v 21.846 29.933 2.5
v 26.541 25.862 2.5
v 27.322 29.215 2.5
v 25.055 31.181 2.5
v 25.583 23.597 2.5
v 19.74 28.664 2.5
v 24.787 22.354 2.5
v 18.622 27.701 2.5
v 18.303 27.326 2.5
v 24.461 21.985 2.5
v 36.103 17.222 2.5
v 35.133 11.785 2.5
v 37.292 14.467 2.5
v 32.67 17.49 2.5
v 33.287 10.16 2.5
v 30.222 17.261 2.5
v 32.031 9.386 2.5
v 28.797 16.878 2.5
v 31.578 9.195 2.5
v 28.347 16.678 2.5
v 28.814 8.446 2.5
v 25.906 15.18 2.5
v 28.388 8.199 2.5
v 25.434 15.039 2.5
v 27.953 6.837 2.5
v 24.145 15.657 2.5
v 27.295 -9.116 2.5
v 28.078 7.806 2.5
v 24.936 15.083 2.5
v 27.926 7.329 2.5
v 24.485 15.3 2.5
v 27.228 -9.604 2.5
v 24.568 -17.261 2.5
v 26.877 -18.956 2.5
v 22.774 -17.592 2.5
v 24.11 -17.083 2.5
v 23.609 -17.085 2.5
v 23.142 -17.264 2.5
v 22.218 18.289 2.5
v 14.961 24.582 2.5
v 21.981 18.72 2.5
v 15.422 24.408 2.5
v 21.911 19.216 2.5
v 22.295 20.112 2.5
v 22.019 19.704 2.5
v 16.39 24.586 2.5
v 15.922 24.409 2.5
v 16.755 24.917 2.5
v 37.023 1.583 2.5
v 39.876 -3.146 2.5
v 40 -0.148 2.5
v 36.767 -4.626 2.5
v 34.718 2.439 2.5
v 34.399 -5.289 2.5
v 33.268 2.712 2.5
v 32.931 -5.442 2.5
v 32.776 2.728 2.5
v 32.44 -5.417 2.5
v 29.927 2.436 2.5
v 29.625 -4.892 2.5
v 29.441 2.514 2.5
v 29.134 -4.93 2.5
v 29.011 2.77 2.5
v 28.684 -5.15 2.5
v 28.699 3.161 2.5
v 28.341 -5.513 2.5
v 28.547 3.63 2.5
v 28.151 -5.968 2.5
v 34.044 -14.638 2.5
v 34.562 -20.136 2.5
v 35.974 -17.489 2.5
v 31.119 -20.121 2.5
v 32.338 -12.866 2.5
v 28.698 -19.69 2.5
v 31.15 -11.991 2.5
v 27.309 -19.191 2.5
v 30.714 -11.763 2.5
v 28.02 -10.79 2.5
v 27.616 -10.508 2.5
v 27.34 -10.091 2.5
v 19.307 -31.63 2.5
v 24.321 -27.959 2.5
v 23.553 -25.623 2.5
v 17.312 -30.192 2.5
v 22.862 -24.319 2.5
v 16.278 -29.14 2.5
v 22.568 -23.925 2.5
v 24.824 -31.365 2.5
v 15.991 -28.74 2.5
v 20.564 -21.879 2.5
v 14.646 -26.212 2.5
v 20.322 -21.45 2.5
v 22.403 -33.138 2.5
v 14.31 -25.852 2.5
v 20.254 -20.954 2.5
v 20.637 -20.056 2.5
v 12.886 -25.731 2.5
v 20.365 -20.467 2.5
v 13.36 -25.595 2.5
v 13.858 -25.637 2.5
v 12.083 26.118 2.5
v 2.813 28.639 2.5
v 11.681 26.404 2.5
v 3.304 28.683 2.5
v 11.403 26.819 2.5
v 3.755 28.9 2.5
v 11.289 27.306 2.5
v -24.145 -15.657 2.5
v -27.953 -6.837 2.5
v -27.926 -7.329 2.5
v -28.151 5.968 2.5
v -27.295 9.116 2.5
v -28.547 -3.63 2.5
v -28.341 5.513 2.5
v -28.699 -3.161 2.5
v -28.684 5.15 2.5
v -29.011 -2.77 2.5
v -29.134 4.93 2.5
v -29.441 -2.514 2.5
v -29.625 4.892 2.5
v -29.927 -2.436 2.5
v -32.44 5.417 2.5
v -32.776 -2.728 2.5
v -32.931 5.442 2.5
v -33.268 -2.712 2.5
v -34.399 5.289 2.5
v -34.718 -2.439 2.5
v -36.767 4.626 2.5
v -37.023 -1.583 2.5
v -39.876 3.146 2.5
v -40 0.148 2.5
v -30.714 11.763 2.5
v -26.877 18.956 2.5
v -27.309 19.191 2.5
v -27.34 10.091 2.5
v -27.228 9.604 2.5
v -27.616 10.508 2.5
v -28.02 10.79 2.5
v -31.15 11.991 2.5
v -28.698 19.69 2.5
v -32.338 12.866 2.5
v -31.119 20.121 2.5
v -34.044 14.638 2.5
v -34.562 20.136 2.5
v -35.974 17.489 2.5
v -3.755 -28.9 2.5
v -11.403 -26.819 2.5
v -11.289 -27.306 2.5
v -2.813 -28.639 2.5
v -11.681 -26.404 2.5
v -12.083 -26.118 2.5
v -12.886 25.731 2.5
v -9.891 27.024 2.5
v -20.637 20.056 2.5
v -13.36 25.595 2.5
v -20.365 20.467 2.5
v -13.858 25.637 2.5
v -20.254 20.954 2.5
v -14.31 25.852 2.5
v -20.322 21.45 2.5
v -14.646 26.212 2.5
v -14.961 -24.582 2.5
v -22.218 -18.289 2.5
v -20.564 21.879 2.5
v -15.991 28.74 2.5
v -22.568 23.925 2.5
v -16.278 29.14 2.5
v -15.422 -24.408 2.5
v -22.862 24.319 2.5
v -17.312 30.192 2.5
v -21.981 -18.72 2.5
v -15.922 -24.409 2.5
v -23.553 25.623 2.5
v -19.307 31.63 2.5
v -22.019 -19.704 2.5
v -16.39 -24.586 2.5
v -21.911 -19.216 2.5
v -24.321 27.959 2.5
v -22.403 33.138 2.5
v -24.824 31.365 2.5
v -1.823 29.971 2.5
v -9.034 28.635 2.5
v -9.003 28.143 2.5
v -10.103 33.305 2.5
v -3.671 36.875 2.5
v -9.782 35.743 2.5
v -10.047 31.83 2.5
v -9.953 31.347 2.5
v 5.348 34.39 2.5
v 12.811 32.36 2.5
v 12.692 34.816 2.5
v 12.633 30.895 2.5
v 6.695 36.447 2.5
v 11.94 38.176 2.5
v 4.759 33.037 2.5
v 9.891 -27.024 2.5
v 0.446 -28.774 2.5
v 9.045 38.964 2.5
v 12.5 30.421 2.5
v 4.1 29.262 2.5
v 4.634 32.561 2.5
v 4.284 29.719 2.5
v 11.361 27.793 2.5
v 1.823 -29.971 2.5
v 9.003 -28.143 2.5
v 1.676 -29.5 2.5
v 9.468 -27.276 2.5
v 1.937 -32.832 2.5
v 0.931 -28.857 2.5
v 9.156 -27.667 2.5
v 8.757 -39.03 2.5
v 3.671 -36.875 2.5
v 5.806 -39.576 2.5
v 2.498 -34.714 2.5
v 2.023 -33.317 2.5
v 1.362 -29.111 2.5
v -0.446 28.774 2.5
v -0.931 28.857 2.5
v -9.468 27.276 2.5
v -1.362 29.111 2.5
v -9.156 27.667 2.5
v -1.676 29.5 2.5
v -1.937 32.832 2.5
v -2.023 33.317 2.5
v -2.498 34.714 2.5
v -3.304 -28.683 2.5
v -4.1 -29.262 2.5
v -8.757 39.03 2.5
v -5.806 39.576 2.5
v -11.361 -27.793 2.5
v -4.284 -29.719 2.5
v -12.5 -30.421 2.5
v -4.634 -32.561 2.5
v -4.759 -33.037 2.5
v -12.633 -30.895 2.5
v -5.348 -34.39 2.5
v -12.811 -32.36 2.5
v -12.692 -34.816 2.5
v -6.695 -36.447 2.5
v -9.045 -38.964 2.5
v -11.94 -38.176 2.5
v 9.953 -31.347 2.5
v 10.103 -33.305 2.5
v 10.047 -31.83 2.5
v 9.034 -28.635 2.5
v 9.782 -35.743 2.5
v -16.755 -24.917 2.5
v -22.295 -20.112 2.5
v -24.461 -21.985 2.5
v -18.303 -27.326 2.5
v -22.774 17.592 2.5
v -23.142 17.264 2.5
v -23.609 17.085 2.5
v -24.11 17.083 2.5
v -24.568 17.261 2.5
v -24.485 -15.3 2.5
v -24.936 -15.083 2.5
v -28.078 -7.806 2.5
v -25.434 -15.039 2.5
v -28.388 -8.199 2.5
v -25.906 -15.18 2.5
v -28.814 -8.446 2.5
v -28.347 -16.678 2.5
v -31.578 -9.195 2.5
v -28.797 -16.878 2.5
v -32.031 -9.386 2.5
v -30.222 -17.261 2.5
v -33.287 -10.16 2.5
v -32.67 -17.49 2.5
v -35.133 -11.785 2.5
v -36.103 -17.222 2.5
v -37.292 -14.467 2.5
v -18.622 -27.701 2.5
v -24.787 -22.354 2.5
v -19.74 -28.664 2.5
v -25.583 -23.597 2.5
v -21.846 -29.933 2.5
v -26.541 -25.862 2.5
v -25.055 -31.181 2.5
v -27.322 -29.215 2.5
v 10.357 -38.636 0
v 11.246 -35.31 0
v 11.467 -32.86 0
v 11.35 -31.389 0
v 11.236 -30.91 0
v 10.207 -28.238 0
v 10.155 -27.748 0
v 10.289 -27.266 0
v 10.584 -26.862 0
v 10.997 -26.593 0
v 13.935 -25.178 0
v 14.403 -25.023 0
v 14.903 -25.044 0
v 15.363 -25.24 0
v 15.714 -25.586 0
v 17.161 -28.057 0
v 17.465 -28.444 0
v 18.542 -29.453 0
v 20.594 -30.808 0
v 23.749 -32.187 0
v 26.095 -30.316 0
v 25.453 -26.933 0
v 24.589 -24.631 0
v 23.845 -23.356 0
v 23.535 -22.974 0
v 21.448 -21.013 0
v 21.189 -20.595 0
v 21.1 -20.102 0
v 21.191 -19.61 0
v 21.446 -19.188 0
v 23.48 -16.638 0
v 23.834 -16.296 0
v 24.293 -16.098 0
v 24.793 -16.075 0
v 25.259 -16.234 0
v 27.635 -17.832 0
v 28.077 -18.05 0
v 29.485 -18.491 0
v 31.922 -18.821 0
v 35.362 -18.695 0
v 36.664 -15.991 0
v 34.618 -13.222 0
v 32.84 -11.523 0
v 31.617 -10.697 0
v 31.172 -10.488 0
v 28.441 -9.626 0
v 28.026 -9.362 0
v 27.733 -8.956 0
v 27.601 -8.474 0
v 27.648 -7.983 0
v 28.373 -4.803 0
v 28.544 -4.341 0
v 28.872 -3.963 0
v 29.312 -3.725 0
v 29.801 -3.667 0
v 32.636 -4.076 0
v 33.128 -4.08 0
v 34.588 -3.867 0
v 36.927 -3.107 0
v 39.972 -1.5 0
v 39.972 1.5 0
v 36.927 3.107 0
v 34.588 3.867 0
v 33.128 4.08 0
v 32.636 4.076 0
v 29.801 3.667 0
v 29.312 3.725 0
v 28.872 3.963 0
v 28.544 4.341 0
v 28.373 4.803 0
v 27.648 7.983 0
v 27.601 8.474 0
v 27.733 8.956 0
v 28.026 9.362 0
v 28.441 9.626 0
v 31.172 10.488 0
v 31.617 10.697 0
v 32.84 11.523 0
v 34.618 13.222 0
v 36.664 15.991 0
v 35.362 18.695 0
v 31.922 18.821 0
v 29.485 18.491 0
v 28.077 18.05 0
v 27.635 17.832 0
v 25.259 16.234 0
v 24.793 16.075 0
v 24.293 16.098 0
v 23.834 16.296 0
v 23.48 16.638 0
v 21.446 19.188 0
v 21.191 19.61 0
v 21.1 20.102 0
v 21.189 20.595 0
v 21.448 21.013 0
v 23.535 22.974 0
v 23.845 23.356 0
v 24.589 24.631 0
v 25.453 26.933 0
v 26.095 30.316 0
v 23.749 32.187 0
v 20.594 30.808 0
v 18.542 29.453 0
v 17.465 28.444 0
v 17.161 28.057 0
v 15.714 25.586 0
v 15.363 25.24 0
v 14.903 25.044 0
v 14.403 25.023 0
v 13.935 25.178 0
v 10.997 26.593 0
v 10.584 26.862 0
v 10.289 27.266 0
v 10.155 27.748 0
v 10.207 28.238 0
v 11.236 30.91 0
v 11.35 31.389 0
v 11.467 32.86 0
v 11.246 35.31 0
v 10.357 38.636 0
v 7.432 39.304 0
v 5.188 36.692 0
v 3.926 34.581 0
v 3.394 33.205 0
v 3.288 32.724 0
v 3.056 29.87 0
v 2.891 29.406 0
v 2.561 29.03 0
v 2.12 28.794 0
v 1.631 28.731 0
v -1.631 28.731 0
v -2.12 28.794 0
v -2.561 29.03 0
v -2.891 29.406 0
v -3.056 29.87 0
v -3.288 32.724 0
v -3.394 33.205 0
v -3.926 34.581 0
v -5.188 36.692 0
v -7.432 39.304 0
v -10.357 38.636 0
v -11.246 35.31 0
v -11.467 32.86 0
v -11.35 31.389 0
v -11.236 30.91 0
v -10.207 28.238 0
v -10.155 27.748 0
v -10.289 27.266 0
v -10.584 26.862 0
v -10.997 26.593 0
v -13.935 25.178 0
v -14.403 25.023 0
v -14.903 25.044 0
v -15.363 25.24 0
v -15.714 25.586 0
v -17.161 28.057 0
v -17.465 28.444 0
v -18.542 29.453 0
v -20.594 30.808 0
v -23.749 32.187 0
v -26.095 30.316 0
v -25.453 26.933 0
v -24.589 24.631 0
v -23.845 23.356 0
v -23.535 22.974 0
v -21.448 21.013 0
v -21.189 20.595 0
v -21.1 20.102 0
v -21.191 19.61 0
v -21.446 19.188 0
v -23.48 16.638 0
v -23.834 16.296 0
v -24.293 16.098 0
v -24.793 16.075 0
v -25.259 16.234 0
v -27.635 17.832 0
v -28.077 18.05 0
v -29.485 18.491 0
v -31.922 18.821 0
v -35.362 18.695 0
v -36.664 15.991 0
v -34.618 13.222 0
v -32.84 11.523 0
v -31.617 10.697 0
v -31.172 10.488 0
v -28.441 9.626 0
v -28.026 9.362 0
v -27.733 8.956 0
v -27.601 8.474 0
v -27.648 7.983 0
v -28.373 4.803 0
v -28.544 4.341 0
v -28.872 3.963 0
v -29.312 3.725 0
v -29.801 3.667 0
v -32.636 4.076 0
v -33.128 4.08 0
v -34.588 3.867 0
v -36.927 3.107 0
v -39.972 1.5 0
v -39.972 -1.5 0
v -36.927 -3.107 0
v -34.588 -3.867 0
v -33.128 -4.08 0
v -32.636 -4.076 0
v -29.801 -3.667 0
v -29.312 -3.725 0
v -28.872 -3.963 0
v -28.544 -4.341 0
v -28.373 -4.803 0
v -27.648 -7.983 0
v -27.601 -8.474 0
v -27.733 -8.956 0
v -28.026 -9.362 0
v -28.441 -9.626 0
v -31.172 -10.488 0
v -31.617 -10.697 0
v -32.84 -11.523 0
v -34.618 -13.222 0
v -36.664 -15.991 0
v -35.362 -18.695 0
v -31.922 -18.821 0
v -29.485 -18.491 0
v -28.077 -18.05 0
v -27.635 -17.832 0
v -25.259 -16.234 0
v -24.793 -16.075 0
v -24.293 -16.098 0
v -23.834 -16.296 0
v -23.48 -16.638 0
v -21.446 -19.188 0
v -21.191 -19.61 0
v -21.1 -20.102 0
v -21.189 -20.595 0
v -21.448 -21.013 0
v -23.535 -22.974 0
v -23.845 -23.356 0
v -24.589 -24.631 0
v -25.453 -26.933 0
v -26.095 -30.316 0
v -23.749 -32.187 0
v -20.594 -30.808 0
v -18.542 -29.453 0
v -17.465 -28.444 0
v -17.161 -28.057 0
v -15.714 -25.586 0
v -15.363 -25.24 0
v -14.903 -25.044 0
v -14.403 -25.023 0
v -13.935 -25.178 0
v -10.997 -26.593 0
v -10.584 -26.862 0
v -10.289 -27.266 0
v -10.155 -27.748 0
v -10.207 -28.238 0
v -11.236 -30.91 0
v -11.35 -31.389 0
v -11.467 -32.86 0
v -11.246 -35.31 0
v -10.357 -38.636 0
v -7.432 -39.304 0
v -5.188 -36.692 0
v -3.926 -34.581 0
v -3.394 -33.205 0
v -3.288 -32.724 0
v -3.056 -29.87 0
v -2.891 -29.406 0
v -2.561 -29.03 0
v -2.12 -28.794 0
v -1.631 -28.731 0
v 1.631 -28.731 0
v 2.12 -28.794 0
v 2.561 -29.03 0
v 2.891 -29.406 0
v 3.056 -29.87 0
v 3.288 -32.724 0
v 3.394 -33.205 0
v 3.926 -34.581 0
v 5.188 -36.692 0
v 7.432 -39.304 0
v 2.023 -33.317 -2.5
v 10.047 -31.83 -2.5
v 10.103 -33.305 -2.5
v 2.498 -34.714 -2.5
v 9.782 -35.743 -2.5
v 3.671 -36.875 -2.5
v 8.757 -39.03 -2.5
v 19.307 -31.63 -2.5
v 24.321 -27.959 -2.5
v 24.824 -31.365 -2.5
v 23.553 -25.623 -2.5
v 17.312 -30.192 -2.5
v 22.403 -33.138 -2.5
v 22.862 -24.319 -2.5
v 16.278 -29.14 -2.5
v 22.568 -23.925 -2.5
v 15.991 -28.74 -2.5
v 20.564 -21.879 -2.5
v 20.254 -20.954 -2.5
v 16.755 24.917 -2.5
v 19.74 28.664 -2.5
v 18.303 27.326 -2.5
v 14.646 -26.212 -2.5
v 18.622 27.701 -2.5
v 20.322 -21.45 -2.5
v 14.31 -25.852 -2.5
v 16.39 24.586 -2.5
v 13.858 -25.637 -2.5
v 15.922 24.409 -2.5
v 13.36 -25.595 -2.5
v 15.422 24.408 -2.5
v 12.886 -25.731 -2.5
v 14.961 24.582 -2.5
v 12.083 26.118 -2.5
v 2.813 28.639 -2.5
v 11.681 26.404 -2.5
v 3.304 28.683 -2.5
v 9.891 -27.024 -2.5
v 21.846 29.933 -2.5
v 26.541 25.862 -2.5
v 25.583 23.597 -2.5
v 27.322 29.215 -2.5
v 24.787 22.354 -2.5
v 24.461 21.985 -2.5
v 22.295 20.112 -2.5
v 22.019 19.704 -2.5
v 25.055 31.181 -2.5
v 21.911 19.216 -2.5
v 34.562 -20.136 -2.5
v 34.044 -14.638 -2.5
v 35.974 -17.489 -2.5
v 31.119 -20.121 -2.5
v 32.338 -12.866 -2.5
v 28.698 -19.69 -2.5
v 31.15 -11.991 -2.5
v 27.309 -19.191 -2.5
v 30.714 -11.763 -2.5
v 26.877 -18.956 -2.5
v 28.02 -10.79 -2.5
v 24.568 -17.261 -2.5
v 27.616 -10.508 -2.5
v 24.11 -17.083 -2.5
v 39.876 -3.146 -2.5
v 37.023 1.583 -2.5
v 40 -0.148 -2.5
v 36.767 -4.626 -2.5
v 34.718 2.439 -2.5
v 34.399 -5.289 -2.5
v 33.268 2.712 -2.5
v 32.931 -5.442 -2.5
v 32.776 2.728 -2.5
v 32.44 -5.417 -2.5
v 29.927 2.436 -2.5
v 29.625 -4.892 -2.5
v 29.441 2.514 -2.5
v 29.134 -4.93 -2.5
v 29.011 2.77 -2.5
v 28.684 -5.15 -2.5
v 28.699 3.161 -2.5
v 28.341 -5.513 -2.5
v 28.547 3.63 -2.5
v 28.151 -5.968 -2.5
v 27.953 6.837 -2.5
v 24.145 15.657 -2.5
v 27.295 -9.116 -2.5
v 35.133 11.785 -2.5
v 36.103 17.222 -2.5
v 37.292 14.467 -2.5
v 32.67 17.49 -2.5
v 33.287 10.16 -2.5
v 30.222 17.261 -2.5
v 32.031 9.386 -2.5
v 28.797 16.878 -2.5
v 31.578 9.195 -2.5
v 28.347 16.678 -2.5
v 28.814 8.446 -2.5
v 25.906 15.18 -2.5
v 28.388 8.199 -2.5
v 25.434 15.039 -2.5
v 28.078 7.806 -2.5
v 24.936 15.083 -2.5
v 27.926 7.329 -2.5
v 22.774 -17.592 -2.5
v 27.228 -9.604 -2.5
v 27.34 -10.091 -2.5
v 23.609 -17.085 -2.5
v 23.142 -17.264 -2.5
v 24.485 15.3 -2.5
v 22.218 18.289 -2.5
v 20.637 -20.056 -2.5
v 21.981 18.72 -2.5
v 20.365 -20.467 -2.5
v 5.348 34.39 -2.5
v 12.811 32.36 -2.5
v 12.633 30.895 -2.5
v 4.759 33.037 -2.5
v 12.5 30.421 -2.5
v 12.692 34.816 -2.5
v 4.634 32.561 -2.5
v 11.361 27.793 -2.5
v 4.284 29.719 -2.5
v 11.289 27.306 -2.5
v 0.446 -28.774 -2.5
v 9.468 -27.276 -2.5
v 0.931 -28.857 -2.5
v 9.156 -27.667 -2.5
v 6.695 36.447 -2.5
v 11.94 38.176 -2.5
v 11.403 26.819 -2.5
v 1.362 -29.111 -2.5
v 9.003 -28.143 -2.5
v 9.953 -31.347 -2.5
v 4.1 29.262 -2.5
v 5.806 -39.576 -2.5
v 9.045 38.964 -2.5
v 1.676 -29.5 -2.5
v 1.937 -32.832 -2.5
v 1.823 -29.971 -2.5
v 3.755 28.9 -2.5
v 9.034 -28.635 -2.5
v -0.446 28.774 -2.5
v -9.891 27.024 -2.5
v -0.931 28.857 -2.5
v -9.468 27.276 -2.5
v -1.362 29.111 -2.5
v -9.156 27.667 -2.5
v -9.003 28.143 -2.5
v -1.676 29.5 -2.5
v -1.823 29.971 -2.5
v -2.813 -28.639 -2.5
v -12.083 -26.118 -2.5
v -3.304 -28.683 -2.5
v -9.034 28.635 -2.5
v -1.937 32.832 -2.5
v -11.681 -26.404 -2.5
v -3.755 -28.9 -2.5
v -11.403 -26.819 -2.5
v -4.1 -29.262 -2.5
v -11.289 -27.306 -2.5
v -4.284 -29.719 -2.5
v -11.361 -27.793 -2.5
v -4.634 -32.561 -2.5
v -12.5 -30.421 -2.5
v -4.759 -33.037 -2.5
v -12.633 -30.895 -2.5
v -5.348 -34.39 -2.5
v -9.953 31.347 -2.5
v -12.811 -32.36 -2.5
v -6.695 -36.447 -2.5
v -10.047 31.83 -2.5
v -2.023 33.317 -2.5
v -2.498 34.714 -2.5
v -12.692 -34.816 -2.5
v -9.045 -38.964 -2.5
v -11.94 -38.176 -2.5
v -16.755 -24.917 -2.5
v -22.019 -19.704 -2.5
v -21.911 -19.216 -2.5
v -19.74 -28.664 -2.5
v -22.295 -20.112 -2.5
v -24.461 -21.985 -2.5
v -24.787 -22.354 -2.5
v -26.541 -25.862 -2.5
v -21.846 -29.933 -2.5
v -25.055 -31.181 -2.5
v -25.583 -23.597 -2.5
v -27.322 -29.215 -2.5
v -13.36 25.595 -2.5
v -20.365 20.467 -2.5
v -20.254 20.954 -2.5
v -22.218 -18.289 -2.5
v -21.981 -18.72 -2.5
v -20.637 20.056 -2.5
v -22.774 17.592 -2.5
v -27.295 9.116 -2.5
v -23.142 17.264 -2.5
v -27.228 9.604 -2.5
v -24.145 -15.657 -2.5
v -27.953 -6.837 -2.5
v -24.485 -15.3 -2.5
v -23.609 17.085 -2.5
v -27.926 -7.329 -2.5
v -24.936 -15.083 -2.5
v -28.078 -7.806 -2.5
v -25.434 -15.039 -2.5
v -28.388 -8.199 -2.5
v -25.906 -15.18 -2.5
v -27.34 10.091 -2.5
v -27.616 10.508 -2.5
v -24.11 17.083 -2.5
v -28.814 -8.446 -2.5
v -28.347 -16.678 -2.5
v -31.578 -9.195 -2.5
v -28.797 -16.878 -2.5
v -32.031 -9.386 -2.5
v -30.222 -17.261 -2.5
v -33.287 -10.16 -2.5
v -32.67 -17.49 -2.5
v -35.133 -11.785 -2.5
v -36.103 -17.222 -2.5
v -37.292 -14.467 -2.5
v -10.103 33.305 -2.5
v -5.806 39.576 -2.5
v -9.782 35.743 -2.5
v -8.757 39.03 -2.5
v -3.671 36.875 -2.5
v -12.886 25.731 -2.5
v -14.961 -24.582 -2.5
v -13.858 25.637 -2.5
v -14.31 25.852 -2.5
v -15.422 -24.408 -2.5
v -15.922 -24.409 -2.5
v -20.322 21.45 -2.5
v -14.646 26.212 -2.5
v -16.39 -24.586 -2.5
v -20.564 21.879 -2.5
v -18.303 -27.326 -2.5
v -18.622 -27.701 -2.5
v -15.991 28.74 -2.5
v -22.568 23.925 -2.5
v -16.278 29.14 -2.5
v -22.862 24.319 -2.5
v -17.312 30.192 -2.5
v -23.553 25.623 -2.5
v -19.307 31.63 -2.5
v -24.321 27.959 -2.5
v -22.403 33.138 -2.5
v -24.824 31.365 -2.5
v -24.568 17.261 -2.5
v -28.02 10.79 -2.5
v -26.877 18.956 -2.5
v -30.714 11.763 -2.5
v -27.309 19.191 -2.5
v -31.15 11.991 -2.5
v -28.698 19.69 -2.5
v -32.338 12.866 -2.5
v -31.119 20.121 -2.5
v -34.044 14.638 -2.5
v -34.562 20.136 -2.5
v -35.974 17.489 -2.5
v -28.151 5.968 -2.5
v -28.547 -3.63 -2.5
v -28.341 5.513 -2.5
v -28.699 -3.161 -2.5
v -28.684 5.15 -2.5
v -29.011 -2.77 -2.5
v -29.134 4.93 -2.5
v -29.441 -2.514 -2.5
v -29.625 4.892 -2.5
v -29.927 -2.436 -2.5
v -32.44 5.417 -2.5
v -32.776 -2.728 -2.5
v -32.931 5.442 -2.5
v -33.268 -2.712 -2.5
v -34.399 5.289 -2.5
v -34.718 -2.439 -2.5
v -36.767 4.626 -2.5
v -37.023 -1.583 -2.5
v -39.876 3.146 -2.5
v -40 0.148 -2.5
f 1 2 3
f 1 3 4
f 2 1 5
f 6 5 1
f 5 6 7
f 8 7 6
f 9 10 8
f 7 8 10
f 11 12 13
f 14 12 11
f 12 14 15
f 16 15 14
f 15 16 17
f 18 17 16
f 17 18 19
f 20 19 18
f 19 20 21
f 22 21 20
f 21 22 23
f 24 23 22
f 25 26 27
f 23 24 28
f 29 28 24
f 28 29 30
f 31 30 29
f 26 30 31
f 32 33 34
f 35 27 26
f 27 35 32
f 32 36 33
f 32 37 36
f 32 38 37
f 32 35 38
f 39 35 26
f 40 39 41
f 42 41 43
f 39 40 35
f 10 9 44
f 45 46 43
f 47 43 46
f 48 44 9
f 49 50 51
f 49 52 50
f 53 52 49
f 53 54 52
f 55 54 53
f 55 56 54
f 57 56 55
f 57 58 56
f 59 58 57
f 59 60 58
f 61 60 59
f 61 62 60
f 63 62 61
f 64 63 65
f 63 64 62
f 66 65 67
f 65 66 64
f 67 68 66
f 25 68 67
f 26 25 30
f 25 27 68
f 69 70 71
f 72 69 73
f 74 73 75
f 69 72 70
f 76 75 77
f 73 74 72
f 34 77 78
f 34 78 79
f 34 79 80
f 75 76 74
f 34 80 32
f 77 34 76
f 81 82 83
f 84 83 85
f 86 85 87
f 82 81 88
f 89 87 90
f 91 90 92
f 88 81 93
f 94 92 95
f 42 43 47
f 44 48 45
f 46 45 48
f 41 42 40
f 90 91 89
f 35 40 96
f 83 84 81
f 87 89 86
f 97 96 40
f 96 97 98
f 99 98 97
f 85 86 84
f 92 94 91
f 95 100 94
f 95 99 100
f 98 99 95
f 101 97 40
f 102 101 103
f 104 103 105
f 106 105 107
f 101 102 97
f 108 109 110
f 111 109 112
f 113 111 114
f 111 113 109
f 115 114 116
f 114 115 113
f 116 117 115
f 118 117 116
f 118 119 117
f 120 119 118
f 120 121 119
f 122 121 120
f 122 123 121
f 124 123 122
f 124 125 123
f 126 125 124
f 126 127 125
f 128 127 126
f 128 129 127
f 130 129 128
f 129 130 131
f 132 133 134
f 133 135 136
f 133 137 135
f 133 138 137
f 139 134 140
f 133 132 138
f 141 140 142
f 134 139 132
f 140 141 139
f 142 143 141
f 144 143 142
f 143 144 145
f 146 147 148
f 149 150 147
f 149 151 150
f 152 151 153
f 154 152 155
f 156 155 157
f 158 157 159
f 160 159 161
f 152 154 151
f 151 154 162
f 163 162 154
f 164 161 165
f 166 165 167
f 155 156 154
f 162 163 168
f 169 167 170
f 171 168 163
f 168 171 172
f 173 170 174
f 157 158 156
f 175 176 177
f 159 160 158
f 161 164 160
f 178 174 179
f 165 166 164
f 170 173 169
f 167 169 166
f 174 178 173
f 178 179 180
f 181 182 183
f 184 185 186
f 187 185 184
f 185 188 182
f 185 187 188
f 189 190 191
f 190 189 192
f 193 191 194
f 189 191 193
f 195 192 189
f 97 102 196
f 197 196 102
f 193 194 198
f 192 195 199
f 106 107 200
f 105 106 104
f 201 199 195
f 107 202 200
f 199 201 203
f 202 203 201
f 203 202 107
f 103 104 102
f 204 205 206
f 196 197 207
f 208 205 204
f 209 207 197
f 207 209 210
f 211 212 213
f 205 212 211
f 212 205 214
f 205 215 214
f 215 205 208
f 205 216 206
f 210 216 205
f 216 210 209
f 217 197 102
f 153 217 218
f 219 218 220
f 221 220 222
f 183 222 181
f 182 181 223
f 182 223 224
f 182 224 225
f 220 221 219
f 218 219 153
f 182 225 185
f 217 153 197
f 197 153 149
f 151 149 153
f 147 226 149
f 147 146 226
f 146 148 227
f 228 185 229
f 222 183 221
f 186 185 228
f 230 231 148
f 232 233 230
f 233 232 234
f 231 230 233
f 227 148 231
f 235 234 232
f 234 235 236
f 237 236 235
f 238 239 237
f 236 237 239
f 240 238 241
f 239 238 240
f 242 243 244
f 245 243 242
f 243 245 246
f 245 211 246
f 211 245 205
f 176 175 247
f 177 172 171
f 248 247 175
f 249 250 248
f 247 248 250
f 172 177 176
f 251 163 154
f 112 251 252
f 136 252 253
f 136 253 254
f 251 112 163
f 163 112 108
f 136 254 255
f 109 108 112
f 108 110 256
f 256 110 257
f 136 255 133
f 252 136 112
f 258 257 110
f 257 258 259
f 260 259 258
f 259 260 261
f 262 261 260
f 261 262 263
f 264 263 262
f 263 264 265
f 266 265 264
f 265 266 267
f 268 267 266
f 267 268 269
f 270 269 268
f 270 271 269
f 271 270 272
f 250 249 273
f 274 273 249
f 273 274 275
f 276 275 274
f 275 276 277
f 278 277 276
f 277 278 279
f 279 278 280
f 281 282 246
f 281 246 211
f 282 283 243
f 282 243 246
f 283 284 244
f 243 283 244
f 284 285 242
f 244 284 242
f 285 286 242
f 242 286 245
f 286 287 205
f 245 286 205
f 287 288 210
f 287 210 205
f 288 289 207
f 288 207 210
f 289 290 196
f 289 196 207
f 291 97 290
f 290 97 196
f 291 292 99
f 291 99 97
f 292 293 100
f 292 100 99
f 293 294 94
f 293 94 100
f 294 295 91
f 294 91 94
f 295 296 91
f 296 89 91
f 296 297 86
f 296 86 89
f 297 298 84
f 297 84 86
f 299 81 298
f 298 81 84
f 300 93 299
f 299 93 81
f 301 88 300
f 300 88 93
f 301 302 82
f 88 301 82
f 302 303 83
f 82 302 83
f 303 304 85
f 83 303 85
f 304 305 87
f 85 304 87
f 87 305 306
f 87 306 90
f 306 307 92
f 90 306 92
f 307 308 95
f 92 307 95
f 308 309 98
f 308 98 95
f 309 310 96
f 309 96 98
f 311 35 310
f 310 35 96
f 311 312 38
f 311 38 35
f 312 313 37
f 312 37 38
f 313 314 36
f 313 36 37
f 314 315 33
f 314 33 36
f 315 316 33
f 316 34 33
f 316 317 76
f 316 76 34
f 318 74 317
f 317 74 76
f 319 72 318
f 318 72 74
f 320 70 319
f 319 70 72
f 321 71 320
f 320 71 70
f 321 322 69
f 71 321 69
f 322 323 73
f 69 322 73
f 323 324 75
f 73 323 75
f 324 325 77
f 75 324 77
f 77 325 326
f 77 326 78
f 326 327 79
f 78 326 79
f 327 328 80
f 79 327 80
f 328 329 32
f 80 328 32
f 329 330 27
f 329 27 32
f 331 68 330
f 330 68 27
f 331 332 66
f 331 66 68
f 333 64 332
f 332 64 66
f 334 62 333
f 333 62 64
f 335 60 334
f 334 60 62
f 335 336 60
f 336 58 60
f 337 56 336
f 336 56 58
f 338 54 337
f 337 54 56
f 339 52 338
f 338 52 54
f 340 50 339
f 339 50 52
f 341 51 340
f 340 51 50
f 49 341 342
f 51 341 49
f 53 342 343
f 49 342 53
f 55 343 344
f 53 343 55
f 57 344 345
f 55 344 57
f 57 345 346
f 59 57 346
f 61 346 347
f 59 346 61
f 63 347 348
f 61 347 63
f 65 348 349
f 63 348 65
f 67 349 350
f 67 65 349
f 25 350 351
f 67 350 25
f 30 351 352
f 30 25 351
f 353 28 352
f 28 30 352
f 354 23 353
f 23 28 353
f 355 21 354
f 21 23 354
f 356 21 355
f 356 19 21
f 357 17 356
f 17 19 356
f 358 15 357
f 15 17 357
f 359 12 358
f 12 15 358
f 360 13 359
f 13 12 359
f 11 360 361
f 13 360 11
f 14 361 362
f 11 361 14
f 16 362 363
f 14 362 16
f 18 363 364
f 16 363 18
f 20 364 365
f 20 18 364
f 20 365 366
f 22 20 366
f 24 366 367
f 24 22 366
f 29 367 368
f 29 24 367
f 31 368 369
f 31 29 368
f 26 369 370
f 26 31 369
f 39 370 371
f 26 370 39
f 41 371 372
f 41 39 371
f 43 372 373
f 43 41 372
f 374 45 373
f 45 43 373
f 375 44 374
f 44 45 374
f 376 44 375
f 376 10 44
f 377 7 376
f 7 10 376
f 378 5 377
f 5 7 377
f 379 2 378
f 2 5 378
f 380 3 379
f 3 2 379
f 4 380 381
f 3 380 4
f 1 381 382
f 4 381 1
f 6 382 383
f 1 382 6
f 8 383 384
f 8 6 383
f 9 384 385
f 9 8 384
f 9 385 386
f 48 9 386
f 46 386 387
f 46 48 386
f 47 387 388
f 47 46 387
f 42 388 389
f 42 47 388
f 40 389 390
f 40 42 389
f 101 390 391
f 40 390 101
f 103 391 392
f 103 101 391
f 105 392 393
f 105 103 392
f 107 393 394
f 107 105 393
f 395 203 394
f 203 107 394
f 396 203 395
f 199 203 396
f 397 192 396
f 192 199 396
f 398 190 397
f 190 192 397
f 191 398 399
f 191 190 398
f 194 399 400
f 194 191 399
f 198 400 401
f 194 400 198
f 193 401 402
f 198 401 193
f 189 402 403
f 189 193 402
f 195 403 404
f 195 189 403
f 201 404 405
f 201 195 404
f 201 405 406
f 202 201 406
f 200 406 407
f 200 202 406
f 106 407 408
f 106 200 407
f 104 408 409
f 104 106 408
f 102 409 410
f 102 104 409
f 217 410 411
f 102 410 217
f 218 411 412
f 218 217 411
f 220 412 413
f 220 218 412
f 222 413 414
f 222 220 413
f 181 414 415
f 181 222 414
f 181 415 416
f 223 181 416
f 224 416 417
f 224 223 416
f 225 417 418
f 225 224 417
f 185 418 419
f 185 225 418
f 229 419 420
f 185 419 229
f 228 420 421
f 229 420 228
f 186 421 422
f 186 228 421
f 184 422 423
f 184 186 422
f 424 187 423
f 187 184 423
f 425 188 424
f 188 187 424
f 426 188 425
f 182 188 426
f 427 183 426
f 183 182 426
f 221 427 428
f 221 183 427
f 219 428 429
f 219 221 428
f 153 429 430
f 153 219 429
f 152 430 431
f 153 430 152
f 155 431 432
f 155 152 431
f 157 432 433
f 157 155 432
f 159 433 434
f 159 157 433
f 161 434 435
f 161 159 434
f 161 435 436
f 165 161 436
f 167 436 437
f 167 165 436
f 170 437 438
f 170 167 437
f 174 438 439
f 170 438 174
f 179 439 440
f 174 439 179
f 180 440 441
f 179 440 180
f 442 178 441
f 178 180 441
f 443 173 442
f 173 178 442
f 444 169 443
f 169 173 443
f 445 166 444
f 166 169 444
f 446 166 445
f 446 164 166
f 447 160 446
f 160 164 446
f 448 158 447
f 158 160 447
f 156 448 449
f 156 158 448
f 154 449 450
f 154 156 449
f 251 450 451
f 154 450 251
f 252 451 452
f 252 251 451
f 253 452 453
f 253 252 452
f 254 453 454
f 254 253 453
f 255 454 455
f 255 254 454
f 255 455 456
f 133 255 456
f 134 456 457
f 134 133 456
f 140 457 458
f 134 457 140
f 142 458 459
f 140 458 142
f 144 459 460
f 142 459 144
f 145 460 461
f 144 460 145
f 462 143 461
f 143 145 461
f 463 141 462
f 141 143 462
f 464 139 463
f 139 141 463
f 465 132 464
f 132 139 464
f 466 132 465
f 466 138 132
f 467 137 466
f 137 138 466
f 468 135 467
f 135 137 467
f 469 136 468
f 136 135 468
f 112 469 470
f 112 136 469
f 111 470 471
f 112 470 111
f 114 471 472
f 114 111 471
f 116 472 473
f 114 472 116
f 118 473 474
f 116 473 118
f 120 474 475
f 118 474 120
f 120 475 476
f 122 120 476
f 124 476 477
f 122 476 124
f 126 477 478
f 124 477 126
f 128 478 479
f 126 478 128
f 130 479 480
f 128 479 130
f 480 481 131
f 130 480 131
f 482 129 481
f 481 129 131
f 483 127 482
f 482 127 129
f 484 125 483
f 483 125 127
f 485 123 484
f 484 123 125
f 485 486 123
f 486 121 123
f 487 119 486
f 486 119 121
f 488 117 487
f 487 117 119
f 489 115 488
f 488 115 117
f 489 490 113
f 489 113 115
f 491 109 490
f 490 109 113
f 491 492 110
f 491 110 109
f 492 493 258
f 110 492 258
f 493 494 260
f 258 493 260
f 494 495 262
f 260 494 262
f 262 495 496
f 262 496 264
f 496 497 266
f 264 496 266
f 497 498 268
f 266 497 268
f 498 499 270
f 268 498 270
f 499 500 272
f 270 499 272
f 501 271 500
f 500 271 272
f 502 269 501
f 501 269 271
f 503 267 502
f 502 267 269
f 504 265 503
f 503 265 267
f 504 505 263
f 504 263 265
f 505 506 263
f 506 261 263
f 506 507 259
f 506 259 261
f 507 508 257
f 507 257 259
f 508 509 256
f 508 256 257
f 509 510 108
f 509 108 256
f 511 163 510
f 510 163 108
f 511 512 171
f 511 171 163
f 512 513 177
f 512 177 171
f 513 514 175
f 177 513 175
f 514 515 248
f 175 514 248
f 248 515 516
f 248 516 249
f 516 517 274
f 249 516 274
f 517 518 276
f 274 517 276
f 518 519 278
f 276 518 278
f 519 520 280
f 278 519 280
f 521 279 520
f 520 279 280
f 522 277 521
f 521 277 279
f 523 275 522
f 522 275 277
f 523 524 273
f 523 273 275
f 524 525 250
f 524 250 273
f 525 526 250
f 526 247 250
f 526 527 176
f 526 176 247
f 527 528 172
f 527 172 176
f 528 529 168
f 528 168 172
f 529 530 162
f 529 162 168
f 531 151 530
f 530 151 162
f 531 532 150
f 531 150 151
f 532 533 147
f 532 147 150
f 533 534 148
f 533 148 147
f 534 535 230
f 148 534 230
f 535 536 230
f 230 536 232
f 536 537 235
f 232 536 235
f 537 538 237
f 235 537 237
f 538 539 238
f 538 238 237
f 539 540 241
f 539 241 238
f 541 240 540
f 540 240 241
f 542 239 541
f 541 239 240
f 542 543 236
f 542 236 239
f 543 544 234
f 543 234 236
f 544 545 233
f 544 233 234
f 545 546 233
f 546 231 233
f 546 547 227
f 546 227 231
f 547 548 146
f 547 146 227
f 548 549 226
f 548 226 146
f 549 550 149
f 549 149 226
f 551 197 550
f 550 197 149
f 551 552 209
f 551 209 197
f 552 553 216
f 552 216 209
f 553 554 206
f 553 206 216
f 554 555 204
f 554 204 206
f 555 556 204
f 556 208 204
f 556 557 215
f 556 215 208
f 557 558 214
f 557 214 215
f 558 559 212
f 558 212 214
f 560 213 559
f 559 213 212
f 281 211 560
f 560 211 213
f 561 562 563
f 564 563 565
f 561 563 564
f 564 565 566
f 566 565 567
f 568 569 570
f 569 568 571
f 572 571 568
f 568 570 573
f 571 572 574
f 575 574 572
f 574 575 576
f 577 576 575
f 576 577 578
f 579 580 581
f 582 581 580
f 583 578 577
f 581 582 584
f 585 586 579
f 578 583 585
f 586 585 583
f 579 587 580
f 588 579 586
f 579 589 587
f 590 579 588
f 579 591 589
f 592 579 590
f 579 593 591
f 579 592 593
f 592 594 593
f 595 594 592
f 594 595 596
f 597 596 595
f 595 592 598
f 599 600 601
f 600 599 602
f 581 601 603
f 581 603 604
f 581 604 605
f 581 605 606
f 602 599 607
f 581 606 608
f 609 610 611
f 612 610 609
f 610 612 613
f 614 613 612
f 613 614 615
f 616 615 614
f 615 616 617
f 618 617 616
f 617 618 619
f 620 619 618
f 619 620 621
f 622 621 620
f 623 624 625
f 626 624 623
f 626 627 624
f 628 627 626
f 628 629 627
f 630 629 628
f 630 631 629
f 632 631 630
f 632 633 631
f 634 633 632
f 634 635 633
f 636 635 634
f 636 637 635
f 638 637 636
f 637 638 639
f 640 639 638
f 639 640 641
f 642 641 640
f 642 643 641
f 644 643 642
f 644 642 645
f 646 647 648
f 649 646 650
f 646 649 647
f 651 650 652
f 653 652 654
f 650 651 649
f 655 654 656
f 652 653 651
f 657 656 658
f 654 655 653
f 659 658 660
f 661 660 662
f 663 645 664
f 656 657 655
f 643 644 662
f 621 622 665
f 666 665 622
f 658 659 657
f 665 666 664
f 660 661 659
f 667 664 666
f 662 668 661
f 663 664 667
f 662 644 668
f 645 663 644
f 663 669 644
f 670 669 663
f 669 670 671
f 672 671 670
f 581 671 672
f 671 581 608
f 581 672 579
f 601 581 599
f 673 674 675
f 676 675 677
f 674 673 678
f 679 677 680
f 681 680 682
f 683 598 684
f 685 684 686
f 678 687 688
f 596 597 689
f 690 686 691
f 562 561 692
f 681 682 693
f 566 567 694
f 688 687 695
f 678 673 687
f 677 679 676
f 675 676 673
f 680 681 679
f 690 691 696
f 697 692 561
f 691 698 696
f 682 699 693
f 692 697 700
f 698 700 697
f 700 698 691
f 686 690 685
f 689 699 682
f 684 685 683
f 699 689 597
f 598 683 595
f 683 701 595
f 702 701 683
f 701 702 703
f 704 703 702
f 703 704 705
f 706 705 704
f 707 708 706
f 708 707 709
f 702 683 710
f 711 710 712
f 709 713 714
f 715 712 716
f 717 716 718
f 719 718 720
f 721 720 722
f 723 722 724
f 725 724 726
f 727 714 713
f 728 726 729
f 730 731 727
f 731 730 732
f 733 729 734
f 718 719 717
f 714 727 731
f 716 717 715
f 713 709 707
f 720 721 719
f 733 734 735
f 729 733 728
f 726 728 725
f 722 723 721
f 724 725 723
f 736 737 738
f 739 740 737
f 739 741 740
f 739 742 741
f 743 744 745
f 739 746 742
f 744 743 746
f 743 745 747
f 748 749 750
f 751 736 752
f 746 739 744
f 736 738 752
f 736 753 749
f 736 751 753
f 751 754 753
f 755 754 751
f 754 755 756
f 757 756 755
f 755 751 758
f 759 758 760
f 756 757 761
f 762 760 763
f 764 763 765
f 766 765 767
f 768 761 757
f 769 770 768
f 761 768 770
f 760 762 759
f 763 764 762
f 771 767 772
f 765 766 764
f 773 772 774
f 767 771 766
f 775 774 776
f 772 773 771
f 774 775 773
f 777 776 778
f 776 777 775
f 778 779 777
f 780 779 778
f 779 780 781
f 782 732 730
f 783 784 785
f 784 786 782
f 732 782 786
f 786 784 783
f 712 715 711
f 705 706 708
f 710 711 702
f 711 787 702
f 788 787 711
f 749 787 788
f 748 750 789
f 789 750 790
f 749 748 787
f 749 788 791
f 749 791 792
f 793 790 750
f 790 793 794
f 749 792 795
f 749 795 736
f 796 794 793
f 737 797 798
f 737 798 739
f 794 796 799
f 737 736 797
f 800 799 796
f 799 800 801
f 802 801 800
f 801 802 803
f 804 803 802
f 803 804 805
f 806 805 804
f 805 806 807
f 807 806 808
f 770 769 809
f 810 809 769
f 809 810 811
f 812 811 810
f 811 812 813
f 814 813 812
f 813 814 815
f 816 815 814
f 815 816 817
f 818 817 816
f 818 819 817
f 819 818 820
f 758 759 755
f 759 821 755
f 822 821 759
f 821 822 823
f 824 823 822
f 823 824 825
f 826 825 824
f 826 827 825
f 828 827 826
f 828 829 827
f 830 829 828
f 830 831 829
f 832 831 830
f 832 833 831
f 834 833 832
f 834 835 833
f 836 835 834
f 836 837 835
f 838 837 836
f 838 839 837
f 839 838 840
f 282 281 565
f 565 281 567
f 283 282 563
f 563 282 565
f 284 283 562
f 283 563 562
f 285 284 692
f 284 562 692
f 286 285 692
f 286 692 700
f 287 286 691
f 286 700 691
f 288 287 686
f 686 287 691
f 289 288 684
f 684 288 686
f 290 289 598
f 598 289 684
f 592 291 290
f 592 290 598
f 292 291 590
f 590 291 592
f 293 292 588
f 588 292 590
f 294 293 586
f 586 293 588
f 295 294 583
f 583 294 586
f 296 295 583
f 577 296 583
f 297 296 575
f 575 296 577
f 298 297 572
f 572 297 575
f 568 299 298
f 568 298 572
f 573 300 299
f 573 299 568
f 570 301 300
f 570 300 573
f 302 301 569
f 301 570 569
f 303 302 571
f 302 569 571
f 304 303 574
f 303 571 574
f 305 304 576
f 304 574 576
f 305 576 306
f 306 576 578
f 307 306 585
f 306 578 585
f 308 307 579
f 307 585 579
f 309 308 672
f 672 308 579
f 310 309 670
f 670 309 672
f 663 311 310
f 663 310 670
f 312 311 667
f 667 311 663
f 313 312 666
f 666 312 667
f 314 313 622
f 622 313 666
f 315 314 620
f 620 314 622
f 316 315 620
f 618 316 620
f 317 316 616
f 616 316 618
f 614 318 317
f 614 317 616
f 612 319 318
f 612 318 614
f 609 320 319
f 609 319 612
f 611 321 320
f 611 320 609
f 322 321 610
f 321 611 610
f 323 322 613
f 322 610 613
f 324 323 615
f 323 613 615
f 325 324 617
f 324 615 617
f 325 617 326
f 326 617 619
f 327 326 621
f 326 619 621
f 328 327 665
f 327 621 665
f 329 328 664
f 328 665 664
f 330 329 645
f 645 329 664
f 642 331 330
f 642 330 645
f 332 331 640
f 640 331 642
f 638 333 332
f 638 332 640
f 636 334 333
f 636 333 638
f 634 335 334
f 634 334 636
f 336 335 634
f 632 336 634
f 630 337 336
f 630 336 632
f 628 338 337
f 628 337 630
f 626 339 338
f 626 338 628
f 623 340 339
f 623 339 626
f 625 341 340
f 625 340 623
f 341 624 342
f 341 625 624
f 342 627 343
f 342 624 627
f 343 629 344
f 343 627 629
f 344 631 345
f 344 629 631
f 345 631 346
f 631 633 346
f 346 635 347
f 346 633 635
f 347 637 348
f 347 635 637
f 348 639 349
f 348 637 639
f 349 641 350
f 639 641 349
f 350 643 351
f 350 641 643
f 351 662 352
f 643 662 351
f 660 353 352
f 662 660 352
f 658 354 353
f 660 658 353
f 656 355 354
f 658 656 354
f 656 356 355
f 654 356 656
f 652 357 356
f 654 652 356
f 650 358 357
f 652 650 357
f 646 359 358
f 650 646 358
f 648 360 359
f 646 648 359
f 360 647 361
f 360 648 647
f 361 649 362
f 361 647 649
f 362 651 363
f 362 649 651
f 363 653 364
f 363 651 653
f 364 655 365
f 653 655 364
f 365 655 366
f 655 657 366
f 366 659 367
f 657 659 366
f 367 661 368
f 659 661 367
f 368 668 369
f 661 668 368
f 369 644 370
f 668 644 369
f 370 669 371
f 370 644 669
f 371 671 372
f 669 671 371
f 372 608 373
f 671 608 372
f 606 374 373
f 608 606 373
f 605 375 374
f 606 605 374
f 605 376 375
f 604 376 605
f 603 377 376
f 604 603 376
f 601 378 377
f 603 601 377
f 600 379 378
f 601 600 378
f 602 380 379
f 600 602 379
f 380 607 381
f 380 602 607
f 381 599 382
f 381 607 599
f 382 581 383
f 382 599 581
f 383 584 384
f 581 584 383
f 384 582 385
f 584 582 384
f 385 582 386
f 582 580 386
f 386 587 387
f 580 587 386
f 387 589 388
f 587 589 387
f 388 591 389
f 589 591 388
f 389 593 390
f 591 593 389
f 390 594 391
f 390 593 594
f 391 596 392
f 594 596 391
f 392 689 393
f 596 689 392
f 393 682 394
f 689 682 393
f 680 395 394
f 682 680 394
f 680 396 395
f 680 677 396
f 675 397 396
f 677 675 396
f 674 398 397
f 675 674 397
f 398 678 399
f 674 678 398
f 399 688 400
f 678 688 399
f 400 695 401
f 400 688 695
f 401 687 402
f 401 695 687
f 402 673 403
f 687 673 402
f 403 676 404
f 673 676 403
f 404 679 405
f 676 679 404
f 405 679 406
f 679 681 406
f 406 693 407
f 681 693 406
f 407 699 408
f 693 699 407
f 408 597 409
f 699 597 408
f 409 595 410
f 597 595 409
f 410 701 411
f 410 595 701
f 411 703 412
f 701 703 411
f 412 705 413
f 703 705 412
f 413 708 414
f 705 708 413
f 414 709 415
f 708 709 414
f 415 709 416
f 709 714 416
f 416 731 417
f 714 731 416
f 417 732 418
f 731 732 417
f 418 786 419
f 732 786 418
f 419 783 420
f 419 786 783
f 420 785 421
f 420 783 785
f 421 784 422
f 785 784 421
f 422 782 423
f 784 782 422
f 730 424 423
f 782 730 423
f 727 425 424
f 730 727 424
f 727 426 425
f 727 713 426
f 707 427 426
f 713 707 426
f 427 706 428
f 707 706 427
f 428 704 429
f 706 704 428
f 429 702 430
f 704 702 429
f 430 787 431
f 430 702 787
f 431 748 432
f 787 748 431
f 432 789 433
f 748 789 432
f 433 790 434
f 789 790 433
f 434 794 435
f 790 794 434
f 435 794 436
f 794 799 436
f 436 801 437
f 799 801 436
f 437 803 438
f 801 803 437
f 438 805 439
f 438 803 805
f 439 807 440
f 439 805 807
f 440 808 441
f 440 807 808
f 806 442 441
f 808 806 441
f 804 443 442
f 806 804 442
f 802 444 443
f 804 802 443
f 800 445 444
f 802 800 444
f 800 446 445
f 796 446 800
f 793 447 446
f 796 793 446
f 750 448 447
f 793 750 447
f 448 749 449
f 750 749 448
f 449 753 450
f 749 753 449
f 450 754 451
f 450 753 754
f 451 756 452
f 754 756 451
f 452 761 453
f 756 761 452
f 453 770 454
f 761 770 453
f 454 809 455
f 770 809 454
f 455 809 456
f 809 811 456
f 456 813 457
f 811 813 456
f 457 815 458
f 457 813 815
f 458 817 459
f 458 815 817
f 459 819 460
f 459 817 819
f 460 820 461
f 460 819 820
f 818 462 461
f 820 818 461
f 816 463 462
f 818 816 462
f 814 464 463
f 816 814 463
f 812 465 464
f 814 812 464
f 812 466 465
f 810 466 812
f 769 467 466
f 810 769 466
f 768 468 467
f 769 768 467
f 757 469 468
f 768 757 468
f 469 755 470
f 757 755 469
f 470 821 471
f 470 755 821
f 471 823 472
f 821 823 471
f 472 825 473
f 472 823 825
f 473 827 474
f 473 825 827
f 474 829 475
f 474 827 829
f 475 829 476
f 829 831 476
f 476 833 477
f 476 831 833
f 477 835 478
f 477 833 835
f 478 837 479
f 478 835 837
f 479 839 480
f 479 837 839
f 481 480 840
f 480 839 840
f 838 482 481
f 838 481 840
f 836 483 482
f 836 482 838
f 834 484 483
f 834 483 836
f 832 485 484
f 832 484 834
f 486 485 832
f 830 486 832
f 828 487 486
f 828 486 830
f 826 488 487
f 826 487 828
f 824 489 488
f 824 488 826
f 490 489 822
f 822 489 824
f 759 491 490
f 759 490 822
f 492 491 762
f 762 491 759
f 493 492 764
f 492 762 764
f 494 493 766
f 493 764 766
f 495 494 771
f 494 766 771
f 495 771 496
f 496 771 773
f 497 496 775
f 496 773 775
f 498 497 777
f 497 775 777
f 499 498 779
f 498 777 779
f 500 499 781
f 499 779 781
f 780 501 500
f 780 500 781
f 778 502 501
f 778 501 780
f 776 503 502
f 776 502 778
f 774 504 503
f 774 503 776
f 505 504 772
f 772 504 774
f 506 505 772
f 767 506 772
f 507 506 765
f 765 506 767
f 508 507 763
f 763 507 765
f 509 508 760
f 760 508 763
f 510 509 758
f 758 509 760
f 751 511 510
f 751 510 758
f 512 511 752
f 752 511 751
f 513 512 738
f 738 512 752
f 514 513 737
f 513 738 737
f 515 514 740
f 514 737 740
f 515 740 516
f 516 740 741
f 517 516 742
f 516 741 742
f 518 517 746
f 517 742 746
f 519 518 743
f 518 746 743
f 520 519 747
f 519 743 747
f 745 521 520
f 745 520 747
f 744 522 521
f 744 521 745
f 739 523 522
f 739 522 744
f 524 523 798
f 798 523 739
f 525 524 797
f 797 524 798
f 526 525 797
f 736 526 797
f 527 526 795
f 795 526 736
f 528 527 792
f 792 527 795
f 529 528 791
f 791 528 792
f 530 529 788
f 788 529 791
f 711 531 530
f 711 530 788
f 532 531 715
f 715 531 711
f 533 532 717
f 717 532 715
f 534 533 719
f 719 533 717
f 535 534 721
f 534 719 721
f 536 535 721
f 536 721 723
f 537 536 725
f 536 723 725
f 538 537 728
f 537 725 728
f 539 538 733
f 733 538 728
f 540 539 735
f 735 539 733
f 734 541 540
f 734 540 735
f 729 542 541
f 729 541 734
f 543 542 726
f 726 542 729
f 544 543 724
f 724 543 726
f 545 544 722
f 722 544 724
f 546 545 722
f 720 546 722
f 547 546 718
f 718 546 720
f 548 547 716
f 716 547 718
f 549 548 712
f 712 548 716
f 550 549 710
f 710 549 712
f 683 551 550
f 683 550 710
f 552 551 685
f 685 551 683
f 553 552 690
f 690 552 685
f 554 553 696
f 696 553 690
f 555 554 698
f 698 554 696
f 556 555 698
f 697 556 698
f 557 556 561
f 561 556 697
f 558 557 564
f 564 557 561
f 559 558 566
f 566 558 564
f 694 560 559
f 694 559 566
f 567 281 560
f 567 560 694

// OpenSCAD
$fa=1;$fs=1;

module gear(m=5,z=14, n=4,alpha=20,jt=.1){
	r2d=function(x)x/PI*180;
	d2r=function(x)x*PI/180;
	_sin=function(x)sin(r2d(x));
	_cos=function(x)cos(r2d(x));
	_tan=function(x)tan(r2d(x));
	_atan=function(x)d2r(atan(x));
	mix=function(a,b,x)a*(1-x)+b*x;

	df=.25;
	r=m*z/2;
	rb=r*cos(alpha);
	ra=r+m;
	rf=function(x=1)r-m*(1+df*x);

	f=1;
	td=2*PI/z;
	tmax=sqrt((ra/rb)^2-1);
	tt=td/4+tan(alpha)-d2r(alpha)-_tan(jt/r);
	cr=m/(2*sin(alpha));
	ci=function(t)[rb*(_cos(t)+t*_sin(t)),rb*(_sin(t)-t*_cos(t))];
	add=function(a,b)[a.x+b.x,a.y+b.y];
	rot=function(p,t)let(x=p[0],y=p[1],s=_sin(t),c=_cos(t))[c*x-s*y,s*x+c*y];

	polygon([
		for(j=[0:z-1])each let(t=td*j)[
			for(i=[ 0:n])let(x=ci(i/n*tmax))if(rf(1-f)<norm(x))rot(x,t-tt),
			for(i=[-n:0])let(x=ci(i/n*tmax))if(rf(1-f)<norm(x))rot(x,t+tt),
			for(i=[-n:0])let(i=i/n)rot([rf(1-f*-_cos(PI/2*i))+m*.25*f, m*.25*f],t+tt+_atan(m*df*f*+_sin(PI/2*i)/rf())),
			for(i=[ 0:n])let(i=i/n)rot([rf(1-f*-_cos(PI/2*i))+m*.25*f,-m*.25*f],t+td-tt-_atan(m*df*f*-_sin(PI/2*i)/rf())),
		]
	]);
}

/*
z=14;m=5;
t=$t*360/z;
linear_extrude(3){
	translate([-m*z/2,0])rotate(t)gear(m,z);
	translate([ m*z/2,0])rotate(360/z/2-t)gear(m,z);
}
*/

module yamaba(m=5,z=14,h=5,a=30, n=4,alpha=20,jt=.1){
	module a(){linear_extrude(h/2,slices=1,twist=atan(h*tan(a)/(z*m)))gear(m,z,n,alpha,jt);}
	union(){a();mirror([0,0,1])a();}
}
yamaba();
